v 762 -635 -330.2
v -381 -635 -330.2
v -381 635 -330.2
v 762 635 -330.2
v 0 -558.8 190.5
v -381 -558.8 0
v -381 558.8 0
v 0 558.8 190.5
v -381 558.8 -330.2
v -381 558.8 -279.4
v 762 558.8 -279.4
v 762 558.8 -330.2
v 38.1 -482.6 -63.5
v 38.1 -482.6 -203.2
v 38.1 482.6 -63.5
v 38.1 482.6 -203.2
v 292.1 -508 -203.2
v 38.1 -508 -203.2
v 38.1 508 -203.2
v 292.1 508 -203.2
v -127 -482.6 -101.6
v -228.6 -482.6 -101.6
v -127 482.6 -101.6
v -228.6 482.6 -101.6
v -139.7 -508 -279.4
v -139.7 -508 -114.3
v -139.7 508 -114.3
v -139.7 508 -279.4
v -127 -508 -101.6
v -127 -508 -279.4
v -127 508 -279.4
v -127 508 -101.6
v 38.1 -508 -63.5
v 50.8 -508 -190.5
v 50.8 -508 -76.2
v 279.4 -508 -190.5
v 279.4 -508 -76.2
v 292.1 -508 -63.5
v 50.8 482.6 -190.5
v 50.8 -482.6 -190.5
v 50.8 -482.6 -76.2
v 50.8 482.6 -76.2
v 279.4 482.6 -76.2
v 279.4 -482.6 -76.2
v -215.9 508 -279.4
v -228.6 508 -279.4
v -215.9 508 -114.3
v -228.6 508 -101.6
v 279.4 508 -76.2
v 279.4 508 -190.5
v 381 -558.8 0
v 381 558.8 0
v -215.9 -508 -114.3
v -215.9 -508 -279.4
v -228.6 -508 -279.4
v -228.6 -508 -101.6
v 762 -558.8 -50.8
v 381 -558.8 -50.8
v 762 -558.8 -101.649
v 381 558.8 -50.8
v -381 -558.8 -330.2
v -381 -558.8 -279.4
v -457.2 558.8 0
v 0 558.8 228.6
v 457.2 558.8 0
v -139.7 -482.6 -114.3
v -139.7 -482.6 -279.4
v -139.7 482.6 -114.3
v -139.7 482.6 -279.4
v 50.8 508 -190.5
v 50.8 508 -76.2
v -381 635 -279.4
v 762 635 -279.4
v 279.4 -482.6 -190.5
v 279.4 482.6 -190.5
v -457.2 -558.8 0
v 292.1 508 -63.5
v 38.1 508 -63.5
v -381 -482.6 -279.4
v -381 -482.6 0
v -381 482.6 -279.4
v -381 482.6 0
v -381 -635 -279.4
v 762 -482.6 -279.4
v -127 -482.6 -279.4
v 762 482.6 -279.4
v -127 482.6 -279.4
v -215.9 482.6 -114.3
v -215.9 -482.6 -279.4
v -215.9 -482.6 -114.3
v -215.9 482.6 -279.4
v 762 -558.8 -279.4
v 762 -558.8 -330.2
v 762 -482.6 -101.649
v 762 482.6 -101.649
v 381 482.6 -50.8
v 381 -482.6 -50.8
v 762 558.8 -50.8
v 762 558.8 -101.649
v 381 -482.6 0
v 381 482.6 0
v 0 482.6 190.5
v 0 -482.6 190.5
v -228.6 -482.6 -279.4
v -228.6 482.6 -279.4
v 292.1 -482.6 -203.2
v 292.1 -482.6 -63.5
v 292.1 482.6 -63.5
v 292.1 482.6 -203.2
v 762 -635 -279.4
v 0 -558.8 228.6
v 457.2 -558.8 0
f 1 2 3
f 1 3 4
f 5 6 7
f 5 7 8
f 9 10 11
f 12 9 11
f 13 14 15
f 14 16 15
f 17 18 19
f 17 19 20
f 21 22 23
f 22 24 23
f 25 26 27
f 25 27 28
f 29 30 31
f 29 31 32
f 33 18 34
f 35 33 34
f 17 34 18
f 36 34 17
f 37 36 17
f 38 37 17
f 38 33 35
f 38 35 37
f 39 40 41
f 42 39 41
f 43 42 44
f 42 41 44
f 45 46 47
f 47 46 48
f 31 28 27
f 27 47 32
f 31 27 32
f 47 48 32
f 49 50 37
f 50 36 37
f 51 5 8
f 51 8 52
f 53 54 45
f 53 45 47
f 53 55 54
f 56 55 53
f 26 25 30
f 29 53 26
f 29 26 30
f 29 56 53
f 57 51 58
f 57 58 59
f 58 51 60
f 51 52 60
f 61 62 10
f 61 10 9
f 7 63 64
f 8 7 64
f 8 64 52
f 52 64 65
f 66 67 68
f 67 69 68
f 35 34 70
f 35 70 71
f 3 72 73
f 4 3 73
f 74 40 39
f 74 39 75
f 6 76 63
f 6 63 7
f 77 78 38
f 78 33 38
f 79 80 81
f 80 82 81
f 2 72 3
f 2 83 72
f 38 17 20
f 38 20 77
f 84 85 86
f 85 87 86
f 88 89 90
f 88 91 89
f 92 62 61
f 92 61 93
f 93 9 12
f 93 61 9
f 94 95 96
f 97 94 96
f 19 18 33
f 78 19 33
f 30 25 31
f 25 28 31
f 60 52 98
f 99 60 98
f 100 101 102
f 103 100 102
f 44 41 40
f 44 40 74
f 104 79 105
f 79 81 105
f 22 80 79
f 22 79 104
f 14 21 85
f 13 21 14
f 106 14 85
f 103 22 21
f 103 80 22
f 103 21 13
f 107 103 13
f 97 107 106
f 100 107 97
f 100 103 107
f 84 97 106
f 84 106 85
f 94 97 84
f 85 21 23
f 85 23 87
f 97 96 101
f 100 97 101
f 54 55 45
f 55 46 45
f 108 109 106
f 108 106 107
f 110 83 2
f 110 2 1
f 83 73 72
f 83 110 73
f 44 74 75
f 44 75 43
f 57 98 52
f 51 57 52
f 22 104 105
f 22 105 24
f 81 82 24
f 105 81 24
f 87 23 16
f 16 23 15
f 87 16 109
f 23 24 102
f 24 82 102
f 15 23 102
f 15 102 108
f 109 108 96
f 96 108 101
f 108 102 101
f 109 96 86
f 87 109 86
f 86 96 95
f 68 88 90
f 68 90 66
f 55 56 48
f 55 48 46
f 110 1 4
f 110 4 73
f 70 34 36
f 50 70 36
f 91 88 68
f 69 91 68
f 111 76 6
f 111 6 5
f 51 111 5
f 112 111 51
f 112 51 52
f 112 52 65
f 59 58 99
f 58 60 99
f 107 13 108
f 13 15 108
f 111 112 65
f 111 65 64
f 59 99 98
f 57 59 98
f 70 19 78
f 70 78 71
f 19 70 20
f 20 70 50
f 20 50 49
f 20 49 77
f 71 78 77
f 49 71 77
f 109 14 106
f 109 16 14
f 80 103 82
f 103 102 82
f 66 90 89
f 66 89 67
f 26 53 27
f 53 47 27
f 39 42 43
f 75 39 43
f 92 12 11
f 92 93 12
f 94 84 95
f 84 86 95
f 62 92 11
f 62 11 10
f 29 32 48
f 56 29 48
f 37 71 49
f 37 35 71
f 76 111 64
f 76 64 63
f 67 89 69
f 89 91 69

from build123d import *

# Parameters (mm, degrees)
F0_W     = 254
F0_H     = 139.7
F0_W_2   = 76.2
F0_H_2   = 165.1
F0_W_3   = 228.6
F0_H_3   = 114.3
F1_DEPTH = 482.6
F2_DEPTH = 508
F0_W_4   = 381
F0_H_4   = 50.8
F3_DEPTH = 558.8
F4_DEPTH = 635


with BuildPart() as f1:
    # F0 (on Front) → F1 (new body, symmetric)
    with BuildSketch(Plane.XZ):
        Polygon((-381, 0), (0, 0), (0, 190.5), align=None)
        Polygon((0, 190.5), (0, 0), (381, 0), align=None)
        Polygon((381, 0), (0, 0), (-381, 0), (-381, -279.4), (-228.6, -279.4), (-228.6, -101.6), (-127, -101.6), (-127, -279.4), (381, -279.4), (381, -50.8), align=None)
        with Locations((165.1, -133.35)):
            Rectangle(F0_W, F0_H, mode=Mode.SUBTRACT)
        Polygon((762, -101.648802), (381, -50.8), (381, -279.4), (762, -279.4), align=None)
        with Locations((-177.8, -196.85)):
            Rectangle(F0_W_2, F0_H_2)
        with Locations((165.1, -133.35)):
            Rectangle(F0_W_3, F0_H_3)
    extrude(amount=F1_DEPTH, both=True)


with BuildPart() as f2:
    # F0 (on Front) → F2 (new body, symmetric)
    with BuildSketch(Plane.XZ):
        Polygon((-228.6, -101.6), (-228.6, -279.4), (-215.9, -279.4), (-215.9, -114.3), (-139.7, -114.3), (-139.7, -279.4), (-127, -279.4), (-127, -101.6), align=None)
        with Locations((165.1, -133.35)):
            Rectangle(F0_W, F0_H)
        with Locations((165.1, -133.35)):
            Rectangle(F0_W_3, F0_H_3, mode=Mode.SUBTRACT)
    extrude(amount=F2_DEPTH, both=True)


with BuildPart() as f3:
    # F0 (on Front) → F3 (new body, symmetric)
    with BuildSketch(Plane.XZ):
        Polygon((-457.2, 0), (-381, 0), (0, 190.5), (0, 228.6), align=None)
        Polygon((762, -50.8), (381, 0), (381, -50.8), (762, -101.648802), align=None)
        with Locations((571.5, -304.8)):
            Rectangle(F0_W_4, F0_H_4)
        Polygon((-228.6, -279.4), (-381, -279.4), (-381, -330.2), (381, -330.2), (381, -279.4), (-127, -279.4), (-139.7, -279.4), (-215.9, -279.4), align=None)
        Polygon((0, 190.5), (381, 0), (457.2, 0), (0, 228.6), align=None)
    extrude(amount=F3_DEPTH, both=True)


with BuildPart() as f4:
    # F0 (on Front) → F4 (new body, symmetric)
    with BuildSketch(Plane.XZ):
        Polygon((-228.6, -279.4), (-381, -279.4), (-381, -330.2), (381, -330.2), (381, -279.4), (-127, -279.4), (-139.7, -279.4), (-215.9, -279.4), align=None)
        with Locations((571.5, -304.8)):
            Rectangle(F0_W_4, F0_H_4)
    extrude(amount=F4_DEPTH, both=True)


solid = Compound([f1.part, f2.part, f3.part, f4.part])
